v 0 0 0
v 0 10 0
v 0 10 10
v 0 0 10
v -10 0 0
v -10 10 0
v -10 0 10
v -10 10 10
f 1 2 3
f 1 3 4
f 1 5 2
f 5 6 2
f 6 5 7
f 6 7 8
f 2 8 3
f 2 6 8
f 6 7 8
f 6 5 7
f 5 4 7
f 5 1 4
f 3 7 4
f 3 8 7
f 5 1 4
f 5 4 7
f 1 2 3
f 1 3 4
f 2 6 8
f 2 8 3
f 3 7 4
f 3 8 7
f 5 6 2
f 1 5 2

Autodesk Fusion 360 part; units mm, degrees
sketch "Sketch1" plane through (0, 0, 0) normal (0, 0, 1) x (1, 0, 0)
  line L0 (0, 0) -> (-10, 0)
  line L1 (-10, 0) -> (-10, 10)
  line L2 (-10, 10) -> (0, 10)
  line L3 (0, 10) -> (0, 0)
extrude "Extrude1" add sketch "Sketch1" along normal blind 10 makes body 1
extrude "Extrude1'" add sketch "Sketch1" along normal blind 10 separate body makes body 2 in component "Tool"
component "Tool" placed x (1, 0, 0) y (0, 1, 0) z (0, 0, 1) at (0, 0, 0)
